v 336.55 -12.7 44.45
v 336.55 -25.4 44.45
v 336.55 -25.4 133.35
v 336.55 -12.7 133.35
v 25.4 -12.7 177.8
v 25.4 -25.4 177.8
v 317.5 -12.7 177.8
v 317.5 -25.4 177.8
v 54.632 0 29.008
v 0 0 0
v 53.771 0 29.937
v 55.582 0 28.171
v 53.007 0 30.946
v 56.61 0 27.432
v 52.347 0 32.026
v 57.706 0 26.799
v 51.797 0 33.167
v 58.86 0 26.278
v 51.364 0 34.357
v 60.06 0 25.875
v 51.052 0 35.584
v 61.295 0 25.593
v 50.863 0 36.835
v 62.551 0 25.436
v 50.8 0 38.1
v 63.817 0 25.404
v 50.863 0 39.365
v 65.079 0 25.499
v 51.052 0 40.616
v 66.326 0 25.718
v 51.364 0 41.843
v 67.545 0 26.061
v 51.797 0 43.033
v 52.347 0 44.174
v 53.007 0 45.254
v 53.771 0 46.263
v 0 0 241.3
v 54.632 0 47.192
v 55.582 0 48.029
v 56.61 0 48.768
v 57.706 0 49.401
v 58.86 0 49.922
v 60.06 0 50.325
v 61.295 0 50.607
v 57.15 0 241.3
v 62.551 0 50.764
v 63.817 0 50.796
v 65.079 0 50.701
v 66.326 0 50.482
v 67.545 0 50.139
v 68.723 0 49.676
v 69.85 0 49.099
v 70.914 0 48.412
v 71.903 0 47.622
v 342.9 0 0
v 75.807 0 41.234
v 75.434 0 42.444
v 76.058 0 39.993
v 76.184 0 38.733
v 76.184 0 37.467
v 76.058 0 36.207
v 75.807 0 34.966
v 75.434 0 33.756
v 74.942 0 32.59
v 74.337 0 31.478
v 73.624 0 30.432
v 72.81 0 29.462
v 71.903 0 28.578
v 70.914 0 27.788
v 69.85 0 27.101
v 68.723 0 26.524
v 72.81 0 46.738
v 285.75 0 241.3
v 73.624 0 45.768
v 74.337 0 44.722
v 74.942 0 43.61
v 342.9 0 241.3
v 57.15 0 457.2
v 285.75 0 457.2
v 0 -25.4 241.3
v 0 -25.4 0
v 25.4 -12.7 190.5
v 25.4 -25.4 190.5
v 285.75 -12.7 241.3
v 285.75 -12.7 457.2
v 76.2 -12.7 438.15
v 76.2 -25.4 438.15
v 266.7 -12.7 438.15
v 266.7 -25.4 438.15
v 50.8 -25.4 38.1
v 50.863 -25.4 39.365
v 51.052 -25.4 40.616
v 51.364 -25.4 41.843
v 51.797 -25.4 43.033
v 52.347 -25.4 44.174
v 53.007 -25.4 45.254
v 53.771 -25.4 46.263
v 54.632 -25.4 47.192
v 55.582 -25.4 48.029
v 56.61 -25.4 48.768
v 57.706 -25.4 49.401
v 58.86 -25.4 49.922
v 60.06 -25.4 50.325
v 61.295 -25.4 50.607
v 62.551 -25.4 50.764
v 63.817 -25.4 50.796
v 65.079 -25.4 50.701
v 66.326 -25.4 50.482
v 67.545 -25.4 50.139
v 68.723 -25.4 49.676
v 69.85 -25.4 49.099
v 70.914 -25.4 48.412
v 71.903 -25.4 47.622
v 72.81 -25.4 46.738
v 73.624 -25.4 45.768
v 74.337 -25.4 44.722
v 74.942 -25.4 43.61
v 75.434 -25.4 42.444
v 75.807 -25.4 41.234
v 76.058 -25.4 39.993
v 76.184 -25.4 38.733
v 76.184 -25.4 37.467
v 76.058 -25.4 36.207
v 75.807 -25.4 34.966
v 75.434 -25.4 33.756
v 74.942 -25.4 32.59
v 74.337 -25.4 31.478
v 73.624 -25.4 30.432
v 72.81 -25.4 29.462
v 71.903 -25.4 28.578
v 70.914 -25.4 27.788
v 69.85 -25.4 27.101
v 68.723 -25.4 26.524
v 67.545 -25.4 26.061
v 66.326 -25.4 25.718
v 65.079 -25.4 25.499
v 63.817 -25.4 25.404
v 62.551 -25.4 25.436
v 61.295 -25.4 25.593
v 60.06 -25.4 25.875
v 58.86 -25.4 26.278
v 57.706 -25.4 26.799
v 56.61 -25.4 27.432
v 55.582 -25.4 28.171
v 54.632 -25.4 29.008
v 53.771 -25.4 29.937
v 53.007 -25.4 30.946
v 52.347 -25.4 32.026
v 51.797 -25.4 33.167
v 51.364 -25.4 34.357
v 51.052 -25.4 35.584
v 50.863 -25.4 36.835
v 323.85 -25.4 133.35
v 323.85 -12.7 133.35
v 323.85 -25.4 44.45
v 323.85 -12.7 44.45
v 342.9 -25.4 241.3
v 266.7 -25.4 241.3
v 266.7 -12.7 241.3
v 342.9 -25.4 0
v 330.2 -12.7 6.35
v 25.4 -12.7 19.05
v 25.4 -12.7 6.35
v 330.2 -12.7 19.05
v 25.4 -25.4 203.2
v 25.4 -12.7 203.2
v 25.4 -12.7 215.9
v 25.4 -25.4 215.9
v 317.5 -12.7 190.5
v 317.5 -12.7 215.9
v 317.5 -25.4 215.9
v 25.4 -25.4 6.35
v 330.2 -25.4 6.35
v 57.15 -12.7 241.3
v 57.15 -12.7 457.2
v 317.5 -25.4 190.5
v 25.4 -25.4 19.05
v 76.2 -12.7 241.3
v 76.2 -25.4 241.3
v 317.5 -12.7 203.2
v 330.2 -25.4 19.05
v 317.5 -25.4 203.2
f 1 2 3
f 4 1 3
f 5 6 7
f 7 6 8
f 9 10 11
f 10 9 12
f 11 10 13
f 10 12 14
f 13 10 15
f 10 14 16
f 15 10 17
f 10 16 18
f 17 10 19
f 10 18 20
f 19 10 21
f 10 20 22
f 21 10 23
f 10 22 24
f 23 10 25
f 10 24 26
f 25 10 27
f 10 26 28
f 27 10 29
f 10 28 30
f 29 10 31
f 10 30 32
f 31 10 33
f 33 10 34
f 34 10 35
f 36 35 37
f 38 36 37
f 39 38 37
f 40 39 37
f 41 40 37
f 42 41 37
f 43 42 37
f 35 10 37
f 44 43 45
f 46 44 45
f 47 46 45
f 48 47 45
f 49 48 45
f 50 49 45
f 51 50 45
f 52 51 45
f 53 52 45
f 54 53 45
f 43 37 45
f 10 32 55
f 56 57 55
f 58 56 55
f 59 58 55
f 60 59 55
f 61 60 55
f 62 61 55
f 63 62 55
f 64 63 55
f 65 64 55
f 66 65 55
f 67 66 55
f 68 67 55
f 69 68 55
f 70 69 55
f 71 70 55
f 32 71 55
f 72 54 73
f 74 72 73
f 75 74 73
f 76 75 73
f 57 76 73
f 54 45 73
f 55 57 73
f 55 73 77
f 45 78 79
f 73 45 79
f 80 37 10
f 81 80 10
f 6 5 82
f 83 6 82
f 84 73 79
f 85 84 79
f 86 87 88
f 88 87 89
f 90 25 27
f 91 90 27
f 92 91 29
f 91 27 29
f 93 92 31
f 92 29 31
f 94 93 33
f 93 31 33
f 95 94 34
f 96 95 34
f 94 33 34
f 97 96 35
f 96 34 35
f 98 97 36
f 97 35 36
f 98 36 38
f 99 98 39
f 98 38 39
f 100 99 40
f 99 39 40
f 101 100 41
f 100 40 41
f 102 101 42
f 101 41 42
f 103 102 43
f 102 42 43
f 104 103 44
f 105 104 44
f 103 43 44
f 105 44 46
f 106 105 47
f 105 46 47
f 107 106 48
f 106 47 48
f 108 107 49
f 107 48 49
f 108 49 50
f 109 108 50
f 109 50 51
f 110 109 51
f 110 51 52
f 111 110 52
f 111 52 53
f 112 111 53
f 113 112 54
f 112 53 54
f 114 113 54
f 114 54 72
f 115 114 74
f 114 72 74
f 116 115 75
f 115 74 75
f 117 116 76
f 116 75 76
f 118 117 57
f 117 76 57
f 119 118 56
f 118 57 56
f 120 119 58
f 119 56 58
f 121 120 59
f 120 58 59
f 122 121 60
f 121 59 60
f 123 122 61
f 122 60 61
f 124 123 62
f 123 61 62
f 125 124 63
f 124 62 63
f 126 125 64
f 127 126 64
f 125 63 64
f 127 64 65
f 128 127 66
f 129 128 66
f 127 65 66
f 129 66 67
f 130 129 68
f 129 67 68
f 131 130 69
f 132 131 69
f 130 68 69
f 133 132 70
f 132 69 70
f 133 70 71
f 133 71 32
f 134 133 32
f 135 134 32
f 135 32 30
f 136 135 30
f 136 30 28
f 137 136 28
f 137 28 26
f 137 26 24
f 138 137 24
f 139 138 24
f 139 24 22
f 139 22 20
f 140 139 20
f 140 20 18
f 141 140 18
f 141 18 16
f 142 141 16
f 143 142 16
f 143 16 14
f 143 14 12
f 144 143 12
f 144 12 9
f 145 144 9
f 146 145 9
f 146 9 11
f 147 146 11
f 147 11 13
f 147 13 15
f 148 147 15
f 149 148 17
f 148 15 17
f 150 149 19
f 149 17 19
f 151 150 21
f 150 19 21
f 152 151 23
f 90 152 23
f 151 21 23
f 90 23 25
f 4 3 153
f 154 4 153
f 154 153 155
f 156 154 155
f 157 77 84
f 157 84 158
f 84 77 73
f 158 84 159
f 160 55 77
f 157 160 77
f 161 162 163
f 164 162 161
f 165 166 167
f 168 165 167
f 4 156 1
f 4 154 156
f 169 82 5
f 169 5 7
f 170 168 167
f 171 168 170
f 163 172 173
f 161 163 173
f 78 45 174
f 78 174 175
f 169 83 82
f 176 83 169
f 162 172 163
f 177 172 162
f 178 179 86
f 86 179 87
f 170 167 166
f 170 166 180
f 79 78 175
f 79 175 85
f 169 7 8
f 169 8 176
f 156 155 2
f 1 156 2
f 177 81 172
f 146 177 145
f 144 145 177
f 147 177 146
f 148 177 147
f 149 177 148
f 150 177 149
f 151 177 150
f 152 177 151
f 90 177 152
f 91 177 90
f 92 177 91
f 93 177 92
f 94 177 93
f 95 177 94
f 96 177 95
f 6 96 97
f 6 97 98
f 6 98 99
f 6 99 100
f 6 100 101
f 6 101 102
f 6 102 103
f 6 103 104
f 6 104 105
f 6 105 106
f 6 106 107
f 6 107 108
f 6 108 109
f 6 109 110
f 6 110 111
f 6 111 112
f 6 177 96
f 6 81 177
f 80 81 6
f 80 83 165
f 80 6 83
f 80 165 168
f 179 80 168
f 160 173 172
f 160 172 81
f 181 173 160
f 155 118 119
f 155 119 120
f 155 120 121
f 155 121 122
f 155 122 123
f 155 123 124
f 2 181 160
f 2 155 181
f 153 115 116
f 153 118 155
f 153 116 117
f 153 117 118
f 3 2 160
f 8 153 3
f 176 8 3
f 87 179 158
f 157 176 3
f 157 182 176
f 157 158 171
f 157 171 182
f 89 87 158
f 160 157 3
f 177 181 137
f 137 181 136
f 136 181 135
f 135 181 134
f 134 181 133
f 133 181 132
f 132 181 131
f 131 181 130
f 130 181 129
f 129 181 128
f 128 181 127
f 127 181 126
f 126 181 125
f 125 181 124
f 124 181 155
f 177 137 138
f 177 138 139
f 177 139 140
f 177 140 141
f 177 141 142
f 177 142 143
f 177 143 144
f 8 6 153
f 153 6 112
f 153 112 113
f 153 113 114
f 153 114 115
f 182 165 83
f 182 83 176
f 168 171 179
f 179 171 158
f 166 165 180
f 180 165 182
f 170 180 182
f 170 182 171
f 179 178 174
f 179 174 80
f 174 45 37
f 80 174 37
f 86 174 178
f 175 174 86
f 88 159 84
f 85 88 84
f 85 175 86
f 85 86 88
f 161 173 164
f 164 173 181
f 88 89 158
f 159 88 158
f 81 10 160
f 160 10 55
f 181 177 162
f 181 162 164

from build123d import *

# Parameters (mm, degrees)
F0_W      = 342.9
F0_H      = 177.8
F0_W_2    = 228.6
F0_H_2    = 215.9
F1_DEPTH  = 25.4
F2_W      = 304.8
F2_H      = 12.7
F3_DEPTH  = 12.7
F4_W      = 304.8
F4_H      = 12.7
F5_DEPTH  = 12.7
F6_R      = 12.7
F7_DEPTH  = 25.4
F9_DEPTH  = 12.7
F10_W     = 190.5
F10_H     = 19.05
F11_DEPTH = 12.7
F12_W     = 292.1
F12_H     = 12.7
F13_DEPTH = 12.7


with BuildPart() as f1:
    # F0 (on Front) → F1 (new body)
    with BuildSketch(Plane.XZ):
        with Locations((171.45, 88.9)):
            Rectangle(F0_W, F0_H)
        Polygon((0, 241.3), (0, 177.8), (342.9, 177.8), (342.9, 241.3), (285.75, 241.3), (57.15, 241.3), align=None)
        with Locations((171.45, 349.25)):
            Rectangle(F0_W_2, F0_H_2)
    extrude(amount=F1_DEPTH)

    # F2 (on face) → F3 (cut)
    with BuildSketch(Plane.XZ.offset(25.4)):
        with Locations((177.8, 12.7)):
            Rectangle(F2_W, F2_H)
    extrude(amount=-F3_DEPTH, mode=Mode.SUBTRACT)

    # F4 (on face) → F5 (cut)
    with BuildSketch(Plane.XZ.offset(25.4)):
        with Locations((177.8, -12.7)):
            Rectangle(F4_W, F4_H)
    extrude(amount=-F5_DEPTH, mode=Mode.SUBTRACT)

    # F6 (on face) → F7 (cut)
    with BuildSketch(Plane(origin=(0, 0, 0), x_dir=(-1, 0, 0), z_dir=(0, 1, 0))):
        with Locations((-63.5, 38.1)):
            Circle(F6_R)
    extrude(amount=-F7_DEPTH, mode=Mode.SUBTRACT)

    # F8 (on face) → F9 (cut)
    with BuildSketch(Plane.XZ.offset(25.4)):
        Polygon((323.85, 44.45), (330.2, 44.45), (336.55, 44.45), (336.55, 133.35), (323.85, 133.35), align=None)
    extrude(amount=-F9_DEPTH, mode=Mode.SUBTRACT)

    # F10 (on face) → F11 (cut)
    with BuildSketch(Plane.XZ.offset(25.4)):
        with Locations((171.45, 447.675)):
            Rectangle(F10_W, F10_H)
        Polygon((76.2, 438.15), (76.2, 457.2), (57.15, 457.2), (57.15, 241.3), (76.2, 241.3), align=None)
        Polygon((285.75, 241.3), (285.75, 457.2), (266.7, 457.2), (266.7, 438.15), (266.7, 241.3), align=None)
    extrude(amount=-F11_DEPTH, mode=Mode.SUBTRACT)

    # F12 (on face) → F13 (cut)
    with BuildSketch(Plane.XZ.offset(25.4)):
        with Locations((171.45, 209.55)):
            Rectangle(F12_W, F12_H)
        with Locations((171.45, 184.15)):
            Rectangle(F12_W, F12_H)
    extrude(amount=-F13_DEPTH, mode=Mode.SUBTRACT)


solid = f1.part
